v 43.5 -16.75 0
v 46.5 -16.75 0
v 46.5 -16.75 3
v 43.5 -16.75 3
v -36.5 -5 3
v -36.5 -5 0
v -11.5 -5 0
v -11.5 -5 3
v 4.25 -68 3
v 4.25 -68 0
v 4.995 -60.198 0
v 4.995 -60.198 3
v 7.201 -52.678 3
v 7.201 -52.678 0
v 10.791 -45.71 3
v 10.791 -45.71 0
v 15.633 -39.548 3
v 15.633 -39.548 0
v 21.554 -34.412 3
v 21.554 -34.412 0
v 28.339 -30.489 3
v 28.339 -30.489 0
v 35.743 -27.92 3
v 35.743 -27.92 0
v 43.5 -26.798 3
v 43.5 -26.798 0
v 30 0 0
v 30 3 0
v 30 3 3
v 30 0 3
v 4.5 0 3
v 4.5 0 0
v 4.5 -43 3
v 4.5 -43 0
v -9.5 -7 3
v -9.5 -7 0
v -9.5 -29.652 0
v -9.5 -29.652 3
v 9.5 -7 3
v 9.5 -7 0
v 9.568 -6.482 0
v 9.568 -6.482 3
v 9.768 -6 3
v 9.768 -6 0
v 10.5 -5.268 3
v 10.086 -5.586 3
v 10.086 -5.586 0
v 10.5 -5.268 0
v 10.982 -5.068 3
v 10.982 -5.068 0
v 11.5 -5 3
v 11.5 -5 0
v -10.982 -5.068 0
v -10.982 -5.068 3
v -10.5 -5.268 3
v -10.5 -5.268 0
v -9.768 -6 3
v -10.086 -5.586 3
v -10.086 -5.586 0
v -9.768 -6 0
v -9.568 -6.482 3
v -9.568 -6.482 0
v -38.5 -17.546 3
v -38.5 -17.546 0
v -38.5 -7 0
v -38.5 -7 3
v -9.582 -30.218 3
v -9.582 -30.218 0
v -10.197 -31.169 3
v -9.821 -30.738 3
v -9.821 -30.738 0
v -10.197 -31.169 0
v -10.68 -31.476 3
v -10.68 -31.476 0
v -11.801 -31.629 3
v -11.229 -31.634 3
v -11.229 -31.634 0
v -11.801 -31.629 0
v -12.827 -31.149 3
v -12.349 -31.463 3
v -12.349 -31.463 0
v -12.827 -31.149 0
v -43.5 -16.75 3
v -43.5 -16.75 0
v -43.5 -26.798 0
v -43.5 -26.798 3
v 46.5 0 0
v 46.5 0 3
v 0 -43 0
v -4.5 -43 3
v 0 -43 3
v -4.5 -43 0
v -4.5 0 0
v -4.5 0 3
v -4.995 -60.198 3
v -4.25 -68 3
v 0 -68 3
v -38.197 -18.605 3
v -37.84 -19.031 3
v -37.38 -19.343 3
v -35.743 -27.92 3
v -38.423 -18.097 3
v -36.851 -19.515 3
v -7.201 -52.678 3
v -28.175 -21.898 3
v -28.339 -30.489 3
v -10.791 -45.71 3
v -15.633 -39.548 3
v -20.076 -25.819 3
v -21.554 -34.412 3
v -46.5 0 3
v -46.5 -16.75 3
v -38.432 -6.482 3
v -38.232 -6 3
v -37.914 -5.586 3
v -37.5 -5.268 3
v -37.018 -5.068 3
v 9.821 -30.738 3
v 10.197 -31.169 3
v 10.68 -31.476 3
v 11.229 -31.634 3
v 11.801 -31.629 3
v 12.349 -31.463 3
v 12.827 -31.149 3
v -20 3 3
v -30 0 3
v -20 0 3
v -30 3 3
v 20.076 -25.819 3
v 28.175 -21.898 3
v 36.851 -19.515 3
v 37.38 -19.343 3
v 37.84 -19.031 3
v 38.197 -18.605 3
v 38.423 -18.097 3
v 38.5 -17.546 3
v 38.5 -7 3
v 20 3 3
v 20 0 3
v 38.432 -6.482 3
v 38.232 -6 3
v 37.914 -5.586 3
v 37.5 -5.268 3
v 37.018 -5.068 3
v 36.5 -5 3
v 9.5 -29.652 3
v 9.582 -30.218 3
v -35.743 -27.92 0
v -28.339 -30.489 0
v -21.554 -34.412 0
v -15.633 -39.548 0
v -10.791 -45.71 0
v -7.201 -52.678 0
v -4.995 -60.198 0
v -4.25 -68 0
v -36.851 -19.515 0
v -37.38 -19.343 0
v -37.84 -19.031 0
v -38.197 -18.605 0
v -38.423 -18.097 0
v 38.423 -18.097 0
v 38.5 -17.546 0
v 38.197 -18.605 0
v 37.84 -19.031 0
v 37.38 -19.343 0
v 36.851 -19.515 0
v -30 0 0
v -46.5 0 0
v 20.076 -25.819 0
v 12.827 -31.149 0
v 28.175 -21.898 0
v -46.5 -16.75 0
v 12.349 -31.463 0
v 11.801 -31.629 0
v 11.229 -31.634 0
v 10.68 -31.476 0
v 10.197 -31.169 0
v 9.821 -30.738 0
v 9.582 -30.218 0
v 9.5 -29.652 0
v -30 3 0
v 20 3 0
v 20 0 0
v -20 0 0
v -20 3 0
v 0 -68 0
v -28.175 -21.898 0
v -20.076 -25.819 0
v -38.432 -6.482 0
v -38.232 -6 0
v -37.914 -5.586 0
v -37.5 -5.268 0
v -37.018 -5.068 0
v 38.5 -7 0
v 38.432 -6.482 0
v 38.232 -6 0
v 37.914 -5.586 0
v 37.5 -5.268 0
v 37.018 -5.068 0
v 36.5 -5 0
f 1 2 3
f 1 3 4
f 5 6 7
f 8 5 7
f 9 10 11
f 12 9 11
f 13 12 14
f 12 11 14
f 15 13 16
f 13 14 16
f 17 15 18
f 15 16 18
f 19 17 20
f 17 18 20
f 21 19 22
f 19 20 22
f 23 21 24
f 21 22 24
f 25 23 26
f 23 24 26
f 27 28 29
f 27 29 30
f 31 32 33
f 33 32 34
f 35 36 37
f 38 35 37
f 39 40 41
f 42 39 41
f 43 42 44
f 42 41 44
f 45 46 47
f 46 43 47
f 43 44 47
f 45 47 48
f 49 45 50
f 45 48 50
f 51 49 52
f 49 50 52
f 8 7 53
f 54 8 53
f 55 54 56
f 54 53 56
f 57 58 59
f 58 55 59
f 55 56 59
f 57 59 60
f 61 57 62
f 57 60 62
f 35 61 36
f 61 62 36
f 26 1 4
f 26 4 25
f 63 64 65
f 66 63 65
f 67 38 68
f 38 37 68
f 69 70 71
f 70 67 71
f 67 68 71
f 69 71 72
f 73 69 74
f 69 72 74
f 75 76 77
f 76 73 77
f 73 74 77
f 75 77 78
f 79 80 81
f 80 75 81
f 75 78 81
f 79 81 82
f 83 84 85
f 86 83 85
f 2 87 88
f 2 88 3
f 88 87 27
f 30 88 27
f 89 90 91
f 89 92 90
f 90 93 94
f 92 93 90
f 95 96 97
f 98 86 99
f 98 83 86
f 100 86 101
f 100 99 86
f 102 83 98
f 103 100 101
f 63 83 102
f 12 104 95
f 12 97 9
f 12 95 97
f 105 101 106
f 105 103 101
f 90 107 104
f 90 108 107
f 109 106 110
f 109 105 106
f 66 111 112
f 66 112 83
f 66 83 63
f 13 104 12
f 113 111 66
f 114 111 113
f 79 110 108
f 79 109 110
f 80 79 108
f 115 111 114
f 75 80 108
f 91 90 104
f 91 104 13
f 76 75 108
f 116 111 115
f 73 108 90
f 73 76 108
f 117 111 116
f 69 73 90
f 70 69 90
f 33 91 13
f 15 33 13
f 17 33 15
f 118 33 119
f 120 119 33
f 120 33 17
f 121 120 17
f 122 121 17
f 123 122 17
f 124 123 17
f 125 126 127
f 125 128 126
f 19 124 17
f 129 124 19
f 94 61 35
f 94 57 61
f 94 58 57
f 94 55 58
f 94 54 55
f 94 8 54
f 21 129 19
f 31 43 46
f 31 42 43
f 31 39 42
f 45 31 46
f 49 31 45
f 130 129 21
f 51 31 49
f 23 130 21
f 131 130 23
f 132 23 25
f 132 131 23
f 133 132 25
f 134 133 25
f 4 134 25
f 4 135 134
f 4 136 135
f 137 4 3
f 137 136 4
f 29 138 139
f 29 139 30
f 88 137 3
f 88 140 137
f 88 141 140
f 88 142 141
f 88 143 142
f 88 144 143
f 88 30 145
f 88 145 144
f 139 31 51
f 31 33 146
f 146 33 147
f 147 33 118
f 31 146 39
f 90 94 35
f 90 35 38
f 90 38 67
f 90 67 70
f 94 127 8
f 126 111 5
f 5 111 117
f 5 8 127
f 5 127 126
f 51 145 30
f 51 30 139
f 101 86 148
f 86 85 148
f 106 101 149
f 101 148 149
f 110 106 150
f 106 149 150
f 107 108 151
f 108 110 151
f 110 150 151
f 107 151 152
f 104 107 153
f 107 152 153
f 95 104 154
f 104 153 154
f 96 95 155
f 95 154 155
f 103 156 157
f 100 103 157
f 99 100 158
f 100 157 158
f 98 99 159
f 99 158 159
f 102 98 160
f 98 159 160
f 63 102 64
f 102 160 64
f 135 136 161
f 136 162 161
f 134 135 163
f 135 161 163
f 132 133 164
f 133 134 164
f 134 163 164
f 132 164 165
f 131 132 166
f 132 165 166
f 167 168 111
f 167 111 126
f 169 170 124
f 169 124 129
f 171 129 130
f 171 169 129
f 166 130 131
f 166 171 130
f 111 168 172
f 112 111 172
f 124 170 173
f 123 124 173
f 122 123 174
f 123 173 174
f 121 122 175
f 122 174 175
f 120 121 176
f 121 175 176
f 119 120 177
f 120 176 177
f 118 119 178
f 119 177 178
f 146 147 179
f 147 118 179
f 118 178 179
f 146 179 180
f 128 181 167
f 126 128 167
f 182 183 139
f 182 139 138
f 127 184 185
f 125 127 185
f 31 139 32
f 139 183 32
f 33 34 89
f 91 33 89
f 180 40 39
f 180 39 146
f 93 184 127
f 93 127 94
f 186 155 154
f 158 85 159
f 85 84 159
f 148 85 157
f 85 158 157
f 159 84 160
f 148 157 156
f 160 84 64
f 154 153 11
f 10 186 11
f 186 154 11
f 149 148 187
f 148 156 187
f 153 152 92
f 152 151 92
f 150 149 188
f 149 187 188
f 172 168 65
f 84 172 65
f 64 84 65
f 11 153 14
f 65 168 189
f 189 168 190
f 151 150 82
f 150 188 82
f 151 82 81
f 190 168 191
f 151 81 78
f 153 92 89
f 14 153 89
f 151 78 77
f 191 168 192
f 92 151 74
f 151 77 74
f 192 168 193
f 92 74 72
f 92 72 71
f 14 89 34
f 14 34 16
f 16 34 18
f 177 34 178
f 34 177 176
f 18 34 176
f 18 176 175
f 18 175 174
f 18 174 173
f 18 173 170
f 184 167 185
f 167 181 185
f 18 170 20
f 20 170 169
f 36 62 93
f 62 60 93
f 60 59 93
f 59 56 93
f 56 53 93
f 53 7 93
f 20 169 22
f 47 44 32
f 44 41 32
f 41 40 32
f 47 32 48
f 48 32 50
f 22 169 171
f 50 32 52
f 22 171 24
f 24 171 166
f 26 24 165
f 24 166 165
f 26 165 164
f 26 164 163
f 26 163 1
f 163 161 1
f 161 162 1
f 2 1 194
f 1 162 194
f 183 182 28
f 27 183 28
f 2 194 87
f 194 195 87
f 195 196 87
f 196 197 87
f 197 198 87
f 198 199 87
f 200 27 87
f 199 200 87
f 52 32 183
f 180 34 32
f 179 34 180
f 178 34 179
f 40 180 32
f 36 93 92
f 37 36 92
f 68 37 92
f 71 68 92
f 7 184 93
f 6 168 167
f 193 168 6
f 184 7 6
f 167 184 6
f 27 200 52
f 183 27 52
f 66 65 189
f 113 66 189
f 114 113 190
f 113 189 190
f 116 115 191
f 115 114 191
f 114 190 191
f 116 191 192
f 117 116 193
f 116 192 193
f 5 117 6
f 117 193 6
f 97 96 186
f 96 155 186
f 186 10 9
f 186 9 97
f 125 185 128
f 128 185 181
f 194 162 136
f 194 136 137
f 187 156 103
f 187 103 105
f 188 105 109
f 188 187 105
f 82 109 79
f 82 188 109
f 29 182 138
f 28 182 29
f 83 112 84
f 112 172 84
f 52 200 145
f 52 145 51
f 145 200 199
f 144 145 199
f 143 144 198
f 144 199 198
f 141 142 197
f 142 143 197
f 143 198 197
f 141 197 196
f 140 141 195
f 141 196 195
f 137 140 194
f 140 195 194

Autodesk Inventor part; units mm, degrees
ref_plane "YZ Plane" through (0, 0, 0) normal (1, 0, 0) x (0, 1, 0)
ref_plane "XZ Plane" through (0, 0, 0) normal (0, 1, 0) x (-1, 0, 0)
ref_plane "XY Plane" through (0, 0, 0) normal (0, 0, 1) x (1, 0, 0)
sketch "Sketch1" plane through (0, 0, 0) normal (0, 0, 1) x (1, 0, 0)
  line L0 (-46.5, 0) -> (-46.5, -16.75)
  line L1 (-46.5, -16.75) -> (-43.5, -16.75)
  arc A0 (-4.25, -68) -> (-43.5, -26.7985) centre (-45.5, -68) ccw
  line L2 (-43.5, -16.75) -> (-43.5, -26.7985)
  line L3 (-4.5, 0) -> (-4.5, -43)
  line L4 (-4.5, -43) -> (0, -43)
  line L5 (-20, 0) -> (-20, 3)
  line L6 (-20, 3) -> (-30, 3)
  line L7 (-30, 3) -> (-30, 0)
  line L8 (-46.5, 0) -> (-30, 0)
  line L9 (-20, 0) -> (-4.5, 0)
  line L10 (-38.5, -17.5464) -> (-38.5, -7)
  line L11 (-36.5, -5) -> (-11.5, -5)
  line L12 (-9.5, -7) -> (-9.5, -29.6521)
  arc A1 (-12.8268, -31.1486) -> (-36.8512, -19.5154) centre (-45.5, -68) ccw
  arc A2 (-38.5, -17.5464) -> (-36.8512, -19.5154) centre (-36.5, -17.5464) ccw
  arc A3 (-36.5, -5) -> (-38.5, -7) centre (-36.5, -7) ccw
  arc A4 (-9.5, -7) -> (-11.5, -5) centre (-11.5, -7) ccw
  arc A5 (-12.8268, -31.1486) -> (-9.5, -29.6521) centre (-11.5, -29.6521) ccw
  line L13 (-4.25, -68) -> (0, -68)
  line L14 (46.5, 0) -> (46.5, -16.75)
  line L15 (46.5, -16.75) -> (43.5, -16.75)
  arc A6 (43.5, -26.7985) -> (4.25, -68) centre (45.5, -68) ccw
  line L16 (43.5, -16.75) -> (43.5, -26.7985)
  line L17 (4.5, 0) -> (4.5, -43)
  line L18 (4.5, -43) -> (0, -43)
  line L19 (20, 0) -> (20, 3)
  line L20 (20, 3) -> (30, 3)
  line L21 (30, 3) -> (30, 0)
  line L22 (46.5, 0) -> (30, 0)
  line L23 (20, 0) -> (4.5, 0)
  line L24 (38.5, -17.5464) -> (38.5, -7)
  line L25 (36.5, -5) -> (11.5, -5)
  line L26 (9.5, -7) -> (9.5, -29.6521)
  arc A7 (36.8512, -19.5154) -> (12.8268, -31.1486) centre (45.5, -68) ccw
  arc A8 (36.8512, -19.5154) -> (38.5, -17.5464) centre (36.5, -17.5464) ccw
  arc A9 (38.5, -7) -> (36.5, -5) centre (36.5, -7) ccw
  arc A10 (11.5, -5) -> (9.5, -7) centre (11.5, -7) ccw
  arc A11 (9.5, -29.6521) -> (12.8268, -31.1486) centre (11.5, -29.6521) ccw
  line L27 (4.25, -68) -> (0, -68)
  point P0 (0, 0)
  point P1 (-9.5, -34.391)
  point P2 (-38.5, -19.25)
  point P3 (9.5, -34.391)
  point P4 (38.5, -19.25)
  dimension "d1" = 46.5
  dimension "d3" = 3
  dimension "d5" = 82.5
  dimension "d7" = 45.5
  dimension "d10" = 10
  dimension "d24" = 10
  dimension "d25" = 20
  dimension "d32" = 8
  dimension "d33" = 5
  dimension "d36" = 15.5
  dimension "d37" = 16.5
  dimension "d38" = 16.75
  dimension "d39" = 5
  dimension "d40" = 2
  dimension "d45" = 8
  dimension "d49" = 68
  dimension "d50" = 25
extrude "Extrusion6" add sketch "Sketch1" along normal blind 3
properties part number "OpenROV 2_3 Dev Ducting Brace"
